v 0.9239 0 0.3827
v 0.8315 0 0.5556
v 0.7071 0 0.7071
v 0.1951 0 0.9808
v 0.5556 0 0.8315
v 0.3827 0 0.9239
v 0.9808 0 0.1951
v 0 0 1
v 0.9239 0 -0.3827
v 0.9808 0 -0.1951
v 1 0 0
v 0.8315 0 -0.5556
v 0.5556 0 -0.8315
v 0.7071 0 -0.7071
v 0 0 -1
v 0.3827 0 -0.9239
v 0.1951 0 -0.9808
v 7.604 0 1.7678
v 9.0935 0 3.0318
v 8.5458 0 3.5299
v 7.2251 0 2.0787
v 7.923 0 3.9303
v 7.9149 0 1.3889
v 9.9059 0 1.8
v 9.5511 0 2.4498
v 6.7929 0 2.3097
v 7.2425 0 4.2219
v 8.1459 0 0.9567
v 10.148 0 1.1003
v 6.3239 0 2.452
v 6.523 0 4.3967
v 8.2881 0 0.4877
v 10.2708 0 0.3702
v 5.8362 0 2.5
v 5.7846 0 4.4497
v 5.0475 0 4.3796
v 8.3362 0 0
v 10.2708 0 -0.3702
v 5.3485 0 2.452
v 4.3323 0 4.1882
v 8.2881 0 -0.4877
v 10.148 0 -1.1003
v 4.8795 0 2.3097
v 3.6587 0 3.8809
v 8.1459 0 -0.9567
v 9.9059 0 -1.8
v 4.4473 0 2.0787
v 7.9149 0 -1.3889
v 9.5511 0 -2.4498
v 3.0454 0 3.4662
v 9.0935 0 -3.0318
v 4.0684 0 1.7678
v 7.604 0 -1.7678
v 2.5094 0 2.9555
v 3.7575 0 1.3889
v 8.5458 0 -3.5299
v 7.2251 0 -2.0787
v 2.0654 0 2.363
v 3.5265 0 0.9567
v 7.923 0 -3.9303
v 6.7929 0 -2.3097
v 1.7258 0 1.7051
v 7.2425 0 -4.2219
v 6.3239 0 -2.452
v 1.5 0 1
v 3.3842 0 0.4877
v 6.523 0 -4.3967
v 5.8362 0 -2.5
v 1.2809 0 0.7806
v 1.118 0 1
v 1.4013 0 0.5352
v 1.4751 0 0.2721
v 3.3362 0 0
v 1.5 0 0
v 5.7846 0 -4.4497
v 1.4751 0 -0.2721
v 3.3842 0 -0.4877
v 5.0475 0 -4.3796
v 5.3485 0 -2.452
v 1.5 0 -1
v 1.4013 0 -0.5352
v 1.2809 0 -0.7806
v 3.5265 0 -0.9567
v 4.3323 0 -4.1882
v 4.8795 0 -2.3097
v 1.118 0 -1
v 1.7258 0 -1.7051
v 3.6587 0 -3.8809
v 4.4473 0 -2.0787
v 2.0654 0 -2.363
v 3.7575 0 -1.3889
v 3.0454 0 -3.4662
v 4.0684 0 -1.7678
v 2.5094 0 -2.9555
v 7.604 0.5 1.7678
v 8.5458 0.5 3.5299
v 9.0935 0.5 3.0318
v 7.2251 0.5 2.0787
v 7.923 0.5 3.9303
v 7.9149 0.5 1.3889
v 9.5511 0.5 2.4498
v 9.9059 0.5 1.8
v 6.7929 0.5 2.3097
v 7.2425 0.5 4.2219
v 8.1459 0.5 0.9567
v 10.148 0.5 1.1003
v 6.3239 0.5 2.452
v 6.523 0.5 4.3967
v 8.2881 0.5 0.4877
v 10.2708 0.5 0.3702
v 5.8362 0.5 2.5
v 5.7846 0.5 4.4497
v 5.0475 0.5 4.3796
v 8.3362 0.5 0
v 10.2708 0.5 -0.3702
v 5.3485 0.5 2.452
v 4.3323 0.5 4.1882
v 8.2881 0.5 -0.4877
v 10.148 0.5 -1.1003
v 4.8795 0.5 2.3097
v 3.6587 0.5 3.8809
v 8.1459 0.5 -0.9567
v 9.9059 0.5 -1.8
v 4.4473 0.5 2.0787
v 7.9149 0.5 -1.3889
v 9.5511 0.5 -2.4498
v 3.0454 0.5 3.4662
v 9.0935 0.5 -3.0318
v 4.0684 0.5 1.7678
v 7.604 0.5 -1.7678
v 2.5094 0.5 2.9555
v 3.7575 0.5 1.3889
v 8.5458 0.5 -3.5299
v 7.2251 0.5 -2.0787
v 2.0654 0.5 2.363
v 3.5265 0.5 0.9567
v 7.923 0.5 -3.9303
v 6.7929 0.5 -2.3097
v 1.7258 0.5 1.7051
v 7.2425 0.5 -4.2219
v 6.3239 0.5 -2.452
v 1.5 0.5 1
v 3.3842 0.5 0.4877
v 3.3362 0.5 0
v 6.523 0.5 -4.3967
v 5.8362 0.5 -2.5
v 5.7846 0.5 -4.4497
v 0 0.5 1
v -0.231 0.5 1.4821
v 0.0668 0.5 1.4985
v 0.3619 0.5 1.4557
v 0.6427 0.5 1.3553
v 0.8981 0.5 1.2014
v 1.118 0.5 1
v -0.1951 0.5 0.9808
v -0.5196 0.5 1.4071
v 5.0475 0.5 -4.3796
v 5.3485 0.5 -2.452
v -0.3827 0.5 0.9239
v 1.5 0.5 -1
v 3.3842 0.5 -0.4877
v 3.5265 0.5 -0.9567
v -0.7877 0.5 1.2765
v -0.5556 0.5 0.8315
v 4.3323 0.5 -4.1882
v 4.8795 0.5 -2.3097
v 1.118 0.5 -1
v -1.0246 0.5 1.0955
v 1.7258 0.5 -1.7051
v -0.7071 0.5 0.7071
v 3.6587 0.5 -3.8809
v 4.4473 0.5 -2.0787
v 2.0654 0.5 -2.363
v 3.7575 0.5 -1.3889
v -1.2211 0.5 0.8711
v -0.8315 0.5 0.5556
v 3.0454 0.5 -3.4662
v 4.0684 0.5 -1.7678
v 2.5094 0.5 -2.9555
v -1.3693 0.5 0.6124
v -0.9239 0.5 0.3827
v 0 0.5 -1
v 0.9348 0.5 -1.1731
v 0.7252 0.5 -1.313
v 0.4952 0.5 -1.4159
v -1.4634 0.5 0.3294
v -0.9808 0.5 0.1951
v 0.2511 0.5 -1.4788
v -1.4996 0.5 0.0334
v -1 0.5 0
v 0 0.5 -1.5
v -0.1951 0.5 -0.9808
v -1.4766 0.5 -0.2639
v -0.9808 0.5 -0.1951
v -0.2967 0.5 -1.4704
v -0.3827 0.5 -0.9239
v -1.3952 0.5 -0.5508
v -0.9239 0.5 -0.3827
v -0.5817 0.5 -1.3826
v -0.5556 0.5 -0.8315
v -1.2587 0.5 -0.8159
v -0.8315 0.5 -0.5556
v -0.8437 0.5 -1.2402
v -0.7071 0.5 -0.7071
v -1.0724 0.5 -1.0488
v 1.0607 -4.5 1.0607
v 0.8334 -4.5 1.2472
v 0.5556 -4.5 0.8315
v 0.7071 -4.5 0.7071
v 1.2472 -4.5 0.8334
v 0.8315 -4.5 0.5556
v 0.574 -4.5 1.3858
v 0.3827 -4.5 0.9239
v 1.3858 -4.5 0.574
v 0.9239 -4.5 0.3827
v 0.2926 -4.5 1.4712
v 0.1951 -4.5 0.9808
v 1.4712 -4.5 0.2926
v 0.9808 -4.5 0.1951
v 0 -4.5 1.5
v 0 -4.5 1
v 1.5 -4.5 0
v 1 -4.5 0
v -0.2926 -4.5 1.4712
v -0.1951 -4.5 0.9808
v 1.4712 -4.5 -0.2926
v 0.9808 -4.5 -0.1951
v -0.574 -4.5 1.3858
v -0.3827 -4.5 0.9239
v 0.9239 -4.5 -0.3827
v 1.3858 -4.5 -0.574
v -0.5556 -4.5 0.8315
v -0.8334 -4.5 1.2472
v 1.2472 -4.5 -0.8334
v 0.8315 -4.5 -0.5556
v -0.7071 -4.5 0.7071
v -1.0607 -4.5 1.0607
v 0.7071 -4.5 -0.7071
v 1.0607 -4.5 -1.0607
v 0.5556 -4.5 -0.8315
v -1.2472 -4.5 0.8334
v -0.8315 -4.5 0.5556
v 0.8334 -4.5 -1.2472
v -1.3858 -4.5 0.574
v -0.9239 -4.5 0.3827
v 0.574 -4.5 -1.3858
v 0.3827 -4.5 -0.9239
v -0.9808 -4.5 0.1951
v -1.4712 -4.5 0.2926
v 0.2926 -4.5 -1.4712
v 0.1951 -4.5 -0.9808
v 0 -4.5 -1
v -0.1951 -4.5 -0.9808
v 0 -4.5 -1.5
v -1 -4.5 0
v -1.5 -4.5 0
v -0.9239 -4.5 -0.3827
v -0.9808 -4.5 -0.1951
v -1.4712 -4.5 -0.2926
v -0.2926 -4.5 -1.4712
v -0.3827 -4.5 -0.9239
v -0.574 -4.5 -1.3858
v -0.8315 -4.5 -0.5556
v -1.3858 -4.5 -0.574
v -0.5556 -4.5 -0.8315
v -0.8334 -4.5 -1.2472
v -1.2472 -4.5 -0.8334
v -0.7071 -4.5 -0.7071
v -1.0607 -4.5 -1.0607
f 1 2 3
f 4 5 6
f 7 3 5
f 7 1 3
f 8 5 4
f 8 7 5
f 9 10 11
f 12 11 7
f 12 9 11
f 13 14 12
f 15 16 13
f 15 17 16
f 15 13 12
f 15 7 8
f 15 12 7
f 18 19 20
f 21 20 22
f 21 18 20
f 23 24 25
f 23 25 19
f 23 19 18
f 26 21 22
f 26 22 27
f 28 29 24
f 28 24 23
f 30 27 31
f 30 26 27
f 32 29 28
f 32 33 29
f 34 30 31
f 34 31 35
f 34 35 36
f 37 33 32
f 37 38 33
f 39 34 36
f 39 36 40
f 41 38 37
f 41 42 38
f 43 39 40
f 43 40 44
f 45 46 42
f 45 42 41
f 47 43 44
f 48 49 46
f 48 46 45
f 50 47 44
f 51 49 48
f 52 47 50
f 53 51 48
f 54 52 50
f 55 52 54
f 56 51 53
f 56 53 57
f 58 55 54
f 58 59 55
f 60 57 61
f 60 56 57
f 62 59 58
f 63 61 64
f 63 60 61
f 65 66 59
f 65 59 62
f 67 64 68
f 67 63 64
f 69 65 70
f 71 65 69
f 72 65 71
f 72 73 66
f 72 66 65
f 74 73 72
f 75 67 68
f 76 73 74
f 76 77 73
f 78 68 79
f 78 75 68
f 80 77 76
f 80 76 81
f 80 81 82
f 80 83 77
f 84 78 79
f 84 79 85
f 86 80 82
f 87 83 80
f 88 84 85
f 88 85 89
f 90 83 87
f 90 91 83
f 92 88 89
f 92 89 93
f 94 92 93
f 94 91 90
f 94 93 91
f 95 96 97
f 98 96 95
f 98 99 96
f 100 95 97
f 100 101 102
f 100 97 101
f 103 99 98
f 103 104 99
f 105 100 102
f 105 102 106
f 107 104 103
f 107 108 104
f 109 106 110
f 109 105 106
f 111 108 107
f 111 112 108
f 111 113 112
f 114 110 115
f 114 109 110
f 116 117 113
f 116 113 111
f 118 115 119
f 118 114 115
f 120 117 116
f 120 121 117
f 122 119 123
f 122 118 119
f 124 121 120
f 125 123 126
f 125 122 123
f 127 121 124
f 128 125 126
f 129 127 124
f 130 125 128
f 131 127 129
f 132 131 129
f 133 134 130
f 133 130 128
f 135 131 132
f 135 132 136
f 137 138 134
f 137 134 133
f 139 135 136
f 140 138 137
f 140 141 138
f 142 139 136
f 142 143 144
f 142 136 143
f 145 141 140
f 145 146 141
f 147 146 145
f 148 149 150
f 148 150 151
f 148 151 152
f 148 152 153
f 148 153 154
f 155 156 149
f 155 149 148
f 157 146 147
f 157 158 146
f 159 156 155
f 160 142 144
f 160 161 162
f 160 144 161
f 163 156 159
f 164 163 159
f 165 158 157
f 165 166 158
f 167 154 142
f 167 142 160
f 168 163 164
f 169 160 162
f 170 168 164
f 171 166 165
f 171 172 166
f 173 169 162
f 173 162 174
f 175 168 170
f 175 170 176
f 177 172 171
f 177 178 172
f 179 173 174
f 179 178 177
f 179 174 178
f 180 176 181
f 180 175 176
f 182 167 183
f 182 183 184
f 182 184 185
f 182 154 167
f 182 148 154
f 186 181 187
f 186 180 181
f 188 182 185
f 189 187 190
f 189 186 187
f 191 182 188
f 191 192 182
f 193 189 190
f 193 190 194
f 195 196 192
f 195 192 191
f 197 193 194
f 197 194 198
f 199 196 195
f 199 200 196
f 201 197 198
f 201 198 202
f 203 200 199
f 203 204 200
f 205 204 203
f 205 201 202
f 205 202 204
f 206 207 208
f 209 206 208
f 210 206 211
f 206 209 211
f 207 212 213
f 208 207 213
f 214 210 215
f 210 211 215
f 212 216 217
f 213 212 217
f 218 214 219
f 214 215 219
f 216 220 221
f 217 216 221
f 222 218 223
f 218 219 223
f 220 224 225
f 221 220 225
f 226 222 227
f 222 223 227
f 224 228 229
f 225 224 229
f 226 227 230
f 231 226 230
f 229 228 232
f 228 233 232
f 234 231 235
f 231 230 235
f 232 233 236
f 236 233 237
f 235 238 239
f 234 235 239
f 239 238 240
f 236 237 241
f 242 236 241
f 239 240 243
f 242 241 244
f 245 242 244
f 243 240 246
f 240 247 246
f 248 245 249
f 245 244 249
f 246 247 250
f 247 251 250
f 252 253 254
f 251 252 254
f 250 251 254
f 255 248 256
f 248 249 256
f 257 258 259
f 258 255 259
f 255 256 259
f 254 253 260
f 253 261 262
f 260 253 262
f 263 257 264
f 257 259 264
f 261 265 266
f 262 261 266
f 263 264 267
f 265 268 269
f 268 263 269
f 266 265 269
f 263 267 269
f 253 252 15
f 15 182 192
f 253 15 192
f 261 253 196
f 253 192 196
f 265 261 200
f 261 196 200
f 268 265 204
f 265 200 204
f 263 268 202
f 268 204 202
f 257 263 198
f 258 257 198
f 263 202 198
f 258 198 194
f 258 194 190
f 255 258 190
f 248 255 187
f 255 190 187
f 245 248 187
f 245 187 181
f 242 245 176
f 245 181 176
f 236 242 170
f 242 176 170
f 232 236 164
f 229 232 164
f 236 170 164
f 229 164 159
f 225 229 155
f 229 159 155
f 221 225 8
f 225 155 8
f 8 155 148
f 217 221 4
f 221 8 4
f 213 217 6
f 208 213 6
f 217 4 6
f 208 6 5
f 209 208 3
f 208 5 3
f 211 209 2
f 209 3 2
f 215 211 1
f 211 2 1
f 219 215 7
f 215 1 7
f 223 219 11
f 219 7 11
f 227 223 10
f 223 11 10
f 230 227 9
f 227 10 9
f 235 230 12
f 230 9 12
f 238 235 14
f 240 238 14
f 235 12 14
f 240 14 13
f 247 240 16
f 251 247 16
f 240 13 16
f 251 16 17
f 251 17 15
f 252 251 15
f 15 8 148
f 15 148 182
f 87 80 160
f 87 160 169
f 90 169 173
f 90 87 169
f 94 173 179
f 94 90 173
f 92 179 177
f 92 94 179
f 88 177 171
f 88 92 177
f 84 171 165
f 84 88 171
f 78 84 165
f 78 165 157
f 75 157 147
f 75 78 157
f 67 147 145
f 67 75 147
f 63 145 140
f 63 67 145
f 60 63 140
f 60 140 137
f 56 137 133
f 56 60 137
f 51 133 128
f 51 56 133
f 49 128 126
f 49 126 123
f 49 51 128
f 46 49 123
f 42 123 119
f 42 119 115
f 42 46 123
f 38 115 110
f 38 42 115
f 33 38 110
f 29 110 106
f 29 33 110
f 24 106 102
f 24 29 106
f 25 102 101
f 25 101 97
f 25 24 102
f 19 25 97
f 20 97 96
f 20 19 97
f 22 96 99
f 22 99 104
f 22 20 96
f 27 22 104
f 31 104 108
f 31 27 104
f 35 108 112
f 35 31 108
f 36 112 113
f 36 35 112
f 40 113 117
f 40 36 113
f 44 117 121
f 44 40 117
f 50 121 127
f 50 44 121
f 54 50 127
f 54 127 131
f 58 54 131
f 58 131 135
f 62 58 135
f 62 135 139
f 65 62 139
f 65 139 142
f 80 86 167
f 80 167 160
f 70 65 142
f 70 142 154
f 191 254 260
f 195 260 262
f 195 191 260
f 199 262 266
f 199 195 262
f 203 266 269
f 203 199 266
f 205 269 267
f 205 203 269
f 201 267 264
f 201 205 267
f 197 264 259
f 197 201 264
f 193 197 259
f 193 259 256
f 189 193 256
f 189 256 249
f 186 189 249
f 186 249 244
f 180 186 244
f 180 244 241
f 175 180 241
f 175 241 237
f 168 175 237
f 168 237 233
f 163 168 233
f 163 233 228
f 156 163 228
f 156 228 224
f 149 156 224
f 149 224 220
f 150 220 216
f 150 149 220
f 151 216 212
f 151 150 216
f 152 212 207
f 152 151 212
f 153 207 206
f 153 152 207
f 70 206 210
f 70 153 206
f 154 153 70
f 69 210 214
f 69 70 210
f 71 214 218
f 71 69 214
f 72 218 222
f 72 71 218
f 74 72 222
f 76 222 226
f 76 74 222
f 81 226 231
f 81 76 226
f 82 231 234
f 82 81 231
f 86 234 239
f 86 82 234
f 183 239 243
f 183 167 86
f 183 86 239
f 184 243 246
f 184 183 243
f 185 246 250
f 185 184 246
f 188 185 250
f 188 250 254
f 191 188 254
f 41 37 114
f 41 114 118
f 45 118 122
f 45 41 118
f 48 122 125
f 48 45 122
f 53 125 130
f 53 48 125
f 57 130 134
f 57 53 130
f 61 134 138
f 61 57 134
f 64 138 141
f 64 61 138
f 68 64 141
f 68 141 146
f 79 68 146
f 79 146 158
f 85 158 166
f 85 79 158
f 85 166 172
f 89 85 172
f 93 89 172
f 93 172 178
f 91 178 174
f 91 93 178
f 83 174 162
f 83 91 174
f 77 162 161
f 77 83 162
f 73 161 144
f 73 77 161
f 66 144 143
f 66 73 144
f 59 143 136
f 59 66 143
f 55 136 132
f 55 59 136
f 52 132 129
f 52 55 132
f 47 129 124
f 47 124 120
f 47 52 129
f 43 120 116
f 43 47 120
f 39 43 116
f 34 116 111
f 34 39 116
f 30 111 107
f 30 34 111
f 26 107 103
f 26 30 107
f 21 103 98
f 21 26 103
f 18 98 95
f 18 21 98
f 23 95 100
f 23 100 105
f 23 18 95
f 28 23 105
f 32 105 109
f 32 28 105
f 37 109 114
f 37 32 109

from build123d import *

# Parameters (mm, degrees)
SKETCH1_R           = 2.5
BOSS_EXTRUDE1_DEPTH = 0.5
SKETCH2_R           = 1.5
SKETCH2_R_2         = 1
BOSS_EXTRUDE2_DEPTH = 5


with BuildPart() as part:
    # Sketch1 → Boss-Extrude1 (new body)
    with BuildSketch(Plane(origin=(0, 0, 0), x_dir=(1, 0, 0), z_dir=(0, 1, 0))):
        with BuildLine():
            Line((0, -1), (0, 1))
            Line((0, 1), (1.5, 1))
            ThreePointArc((1.5, 1), (10.286184959, 0), (1.5, -1))
            Line((1.5, -1), (0, -1))
        make_face()
        with Locations((5.836184959, 0)):
            Circle(SKETCH1_R, mode=Mode.SUBTRACT)
    extrude(amount=BOSS_EXTRUDE1_DEPTH)

    # Sketch2 → Boss-Extrude2 (add)
    with BuildSketch(Plane(origin=(0.5, 0.5, 0), x_dir=(0, 0, -1), z_dir=(0, 1, 0))):
        with Locations((0, 0.5)):
            Circle(SKETCH2_R)
        with Locations((0, 0.5)):
            Circle(SKETCH2_R_2, mode=Mode.SUBTRACT)
    extrude(amount=-BOSS_EXTRUDE2_DEPTH)


solid = part.part
